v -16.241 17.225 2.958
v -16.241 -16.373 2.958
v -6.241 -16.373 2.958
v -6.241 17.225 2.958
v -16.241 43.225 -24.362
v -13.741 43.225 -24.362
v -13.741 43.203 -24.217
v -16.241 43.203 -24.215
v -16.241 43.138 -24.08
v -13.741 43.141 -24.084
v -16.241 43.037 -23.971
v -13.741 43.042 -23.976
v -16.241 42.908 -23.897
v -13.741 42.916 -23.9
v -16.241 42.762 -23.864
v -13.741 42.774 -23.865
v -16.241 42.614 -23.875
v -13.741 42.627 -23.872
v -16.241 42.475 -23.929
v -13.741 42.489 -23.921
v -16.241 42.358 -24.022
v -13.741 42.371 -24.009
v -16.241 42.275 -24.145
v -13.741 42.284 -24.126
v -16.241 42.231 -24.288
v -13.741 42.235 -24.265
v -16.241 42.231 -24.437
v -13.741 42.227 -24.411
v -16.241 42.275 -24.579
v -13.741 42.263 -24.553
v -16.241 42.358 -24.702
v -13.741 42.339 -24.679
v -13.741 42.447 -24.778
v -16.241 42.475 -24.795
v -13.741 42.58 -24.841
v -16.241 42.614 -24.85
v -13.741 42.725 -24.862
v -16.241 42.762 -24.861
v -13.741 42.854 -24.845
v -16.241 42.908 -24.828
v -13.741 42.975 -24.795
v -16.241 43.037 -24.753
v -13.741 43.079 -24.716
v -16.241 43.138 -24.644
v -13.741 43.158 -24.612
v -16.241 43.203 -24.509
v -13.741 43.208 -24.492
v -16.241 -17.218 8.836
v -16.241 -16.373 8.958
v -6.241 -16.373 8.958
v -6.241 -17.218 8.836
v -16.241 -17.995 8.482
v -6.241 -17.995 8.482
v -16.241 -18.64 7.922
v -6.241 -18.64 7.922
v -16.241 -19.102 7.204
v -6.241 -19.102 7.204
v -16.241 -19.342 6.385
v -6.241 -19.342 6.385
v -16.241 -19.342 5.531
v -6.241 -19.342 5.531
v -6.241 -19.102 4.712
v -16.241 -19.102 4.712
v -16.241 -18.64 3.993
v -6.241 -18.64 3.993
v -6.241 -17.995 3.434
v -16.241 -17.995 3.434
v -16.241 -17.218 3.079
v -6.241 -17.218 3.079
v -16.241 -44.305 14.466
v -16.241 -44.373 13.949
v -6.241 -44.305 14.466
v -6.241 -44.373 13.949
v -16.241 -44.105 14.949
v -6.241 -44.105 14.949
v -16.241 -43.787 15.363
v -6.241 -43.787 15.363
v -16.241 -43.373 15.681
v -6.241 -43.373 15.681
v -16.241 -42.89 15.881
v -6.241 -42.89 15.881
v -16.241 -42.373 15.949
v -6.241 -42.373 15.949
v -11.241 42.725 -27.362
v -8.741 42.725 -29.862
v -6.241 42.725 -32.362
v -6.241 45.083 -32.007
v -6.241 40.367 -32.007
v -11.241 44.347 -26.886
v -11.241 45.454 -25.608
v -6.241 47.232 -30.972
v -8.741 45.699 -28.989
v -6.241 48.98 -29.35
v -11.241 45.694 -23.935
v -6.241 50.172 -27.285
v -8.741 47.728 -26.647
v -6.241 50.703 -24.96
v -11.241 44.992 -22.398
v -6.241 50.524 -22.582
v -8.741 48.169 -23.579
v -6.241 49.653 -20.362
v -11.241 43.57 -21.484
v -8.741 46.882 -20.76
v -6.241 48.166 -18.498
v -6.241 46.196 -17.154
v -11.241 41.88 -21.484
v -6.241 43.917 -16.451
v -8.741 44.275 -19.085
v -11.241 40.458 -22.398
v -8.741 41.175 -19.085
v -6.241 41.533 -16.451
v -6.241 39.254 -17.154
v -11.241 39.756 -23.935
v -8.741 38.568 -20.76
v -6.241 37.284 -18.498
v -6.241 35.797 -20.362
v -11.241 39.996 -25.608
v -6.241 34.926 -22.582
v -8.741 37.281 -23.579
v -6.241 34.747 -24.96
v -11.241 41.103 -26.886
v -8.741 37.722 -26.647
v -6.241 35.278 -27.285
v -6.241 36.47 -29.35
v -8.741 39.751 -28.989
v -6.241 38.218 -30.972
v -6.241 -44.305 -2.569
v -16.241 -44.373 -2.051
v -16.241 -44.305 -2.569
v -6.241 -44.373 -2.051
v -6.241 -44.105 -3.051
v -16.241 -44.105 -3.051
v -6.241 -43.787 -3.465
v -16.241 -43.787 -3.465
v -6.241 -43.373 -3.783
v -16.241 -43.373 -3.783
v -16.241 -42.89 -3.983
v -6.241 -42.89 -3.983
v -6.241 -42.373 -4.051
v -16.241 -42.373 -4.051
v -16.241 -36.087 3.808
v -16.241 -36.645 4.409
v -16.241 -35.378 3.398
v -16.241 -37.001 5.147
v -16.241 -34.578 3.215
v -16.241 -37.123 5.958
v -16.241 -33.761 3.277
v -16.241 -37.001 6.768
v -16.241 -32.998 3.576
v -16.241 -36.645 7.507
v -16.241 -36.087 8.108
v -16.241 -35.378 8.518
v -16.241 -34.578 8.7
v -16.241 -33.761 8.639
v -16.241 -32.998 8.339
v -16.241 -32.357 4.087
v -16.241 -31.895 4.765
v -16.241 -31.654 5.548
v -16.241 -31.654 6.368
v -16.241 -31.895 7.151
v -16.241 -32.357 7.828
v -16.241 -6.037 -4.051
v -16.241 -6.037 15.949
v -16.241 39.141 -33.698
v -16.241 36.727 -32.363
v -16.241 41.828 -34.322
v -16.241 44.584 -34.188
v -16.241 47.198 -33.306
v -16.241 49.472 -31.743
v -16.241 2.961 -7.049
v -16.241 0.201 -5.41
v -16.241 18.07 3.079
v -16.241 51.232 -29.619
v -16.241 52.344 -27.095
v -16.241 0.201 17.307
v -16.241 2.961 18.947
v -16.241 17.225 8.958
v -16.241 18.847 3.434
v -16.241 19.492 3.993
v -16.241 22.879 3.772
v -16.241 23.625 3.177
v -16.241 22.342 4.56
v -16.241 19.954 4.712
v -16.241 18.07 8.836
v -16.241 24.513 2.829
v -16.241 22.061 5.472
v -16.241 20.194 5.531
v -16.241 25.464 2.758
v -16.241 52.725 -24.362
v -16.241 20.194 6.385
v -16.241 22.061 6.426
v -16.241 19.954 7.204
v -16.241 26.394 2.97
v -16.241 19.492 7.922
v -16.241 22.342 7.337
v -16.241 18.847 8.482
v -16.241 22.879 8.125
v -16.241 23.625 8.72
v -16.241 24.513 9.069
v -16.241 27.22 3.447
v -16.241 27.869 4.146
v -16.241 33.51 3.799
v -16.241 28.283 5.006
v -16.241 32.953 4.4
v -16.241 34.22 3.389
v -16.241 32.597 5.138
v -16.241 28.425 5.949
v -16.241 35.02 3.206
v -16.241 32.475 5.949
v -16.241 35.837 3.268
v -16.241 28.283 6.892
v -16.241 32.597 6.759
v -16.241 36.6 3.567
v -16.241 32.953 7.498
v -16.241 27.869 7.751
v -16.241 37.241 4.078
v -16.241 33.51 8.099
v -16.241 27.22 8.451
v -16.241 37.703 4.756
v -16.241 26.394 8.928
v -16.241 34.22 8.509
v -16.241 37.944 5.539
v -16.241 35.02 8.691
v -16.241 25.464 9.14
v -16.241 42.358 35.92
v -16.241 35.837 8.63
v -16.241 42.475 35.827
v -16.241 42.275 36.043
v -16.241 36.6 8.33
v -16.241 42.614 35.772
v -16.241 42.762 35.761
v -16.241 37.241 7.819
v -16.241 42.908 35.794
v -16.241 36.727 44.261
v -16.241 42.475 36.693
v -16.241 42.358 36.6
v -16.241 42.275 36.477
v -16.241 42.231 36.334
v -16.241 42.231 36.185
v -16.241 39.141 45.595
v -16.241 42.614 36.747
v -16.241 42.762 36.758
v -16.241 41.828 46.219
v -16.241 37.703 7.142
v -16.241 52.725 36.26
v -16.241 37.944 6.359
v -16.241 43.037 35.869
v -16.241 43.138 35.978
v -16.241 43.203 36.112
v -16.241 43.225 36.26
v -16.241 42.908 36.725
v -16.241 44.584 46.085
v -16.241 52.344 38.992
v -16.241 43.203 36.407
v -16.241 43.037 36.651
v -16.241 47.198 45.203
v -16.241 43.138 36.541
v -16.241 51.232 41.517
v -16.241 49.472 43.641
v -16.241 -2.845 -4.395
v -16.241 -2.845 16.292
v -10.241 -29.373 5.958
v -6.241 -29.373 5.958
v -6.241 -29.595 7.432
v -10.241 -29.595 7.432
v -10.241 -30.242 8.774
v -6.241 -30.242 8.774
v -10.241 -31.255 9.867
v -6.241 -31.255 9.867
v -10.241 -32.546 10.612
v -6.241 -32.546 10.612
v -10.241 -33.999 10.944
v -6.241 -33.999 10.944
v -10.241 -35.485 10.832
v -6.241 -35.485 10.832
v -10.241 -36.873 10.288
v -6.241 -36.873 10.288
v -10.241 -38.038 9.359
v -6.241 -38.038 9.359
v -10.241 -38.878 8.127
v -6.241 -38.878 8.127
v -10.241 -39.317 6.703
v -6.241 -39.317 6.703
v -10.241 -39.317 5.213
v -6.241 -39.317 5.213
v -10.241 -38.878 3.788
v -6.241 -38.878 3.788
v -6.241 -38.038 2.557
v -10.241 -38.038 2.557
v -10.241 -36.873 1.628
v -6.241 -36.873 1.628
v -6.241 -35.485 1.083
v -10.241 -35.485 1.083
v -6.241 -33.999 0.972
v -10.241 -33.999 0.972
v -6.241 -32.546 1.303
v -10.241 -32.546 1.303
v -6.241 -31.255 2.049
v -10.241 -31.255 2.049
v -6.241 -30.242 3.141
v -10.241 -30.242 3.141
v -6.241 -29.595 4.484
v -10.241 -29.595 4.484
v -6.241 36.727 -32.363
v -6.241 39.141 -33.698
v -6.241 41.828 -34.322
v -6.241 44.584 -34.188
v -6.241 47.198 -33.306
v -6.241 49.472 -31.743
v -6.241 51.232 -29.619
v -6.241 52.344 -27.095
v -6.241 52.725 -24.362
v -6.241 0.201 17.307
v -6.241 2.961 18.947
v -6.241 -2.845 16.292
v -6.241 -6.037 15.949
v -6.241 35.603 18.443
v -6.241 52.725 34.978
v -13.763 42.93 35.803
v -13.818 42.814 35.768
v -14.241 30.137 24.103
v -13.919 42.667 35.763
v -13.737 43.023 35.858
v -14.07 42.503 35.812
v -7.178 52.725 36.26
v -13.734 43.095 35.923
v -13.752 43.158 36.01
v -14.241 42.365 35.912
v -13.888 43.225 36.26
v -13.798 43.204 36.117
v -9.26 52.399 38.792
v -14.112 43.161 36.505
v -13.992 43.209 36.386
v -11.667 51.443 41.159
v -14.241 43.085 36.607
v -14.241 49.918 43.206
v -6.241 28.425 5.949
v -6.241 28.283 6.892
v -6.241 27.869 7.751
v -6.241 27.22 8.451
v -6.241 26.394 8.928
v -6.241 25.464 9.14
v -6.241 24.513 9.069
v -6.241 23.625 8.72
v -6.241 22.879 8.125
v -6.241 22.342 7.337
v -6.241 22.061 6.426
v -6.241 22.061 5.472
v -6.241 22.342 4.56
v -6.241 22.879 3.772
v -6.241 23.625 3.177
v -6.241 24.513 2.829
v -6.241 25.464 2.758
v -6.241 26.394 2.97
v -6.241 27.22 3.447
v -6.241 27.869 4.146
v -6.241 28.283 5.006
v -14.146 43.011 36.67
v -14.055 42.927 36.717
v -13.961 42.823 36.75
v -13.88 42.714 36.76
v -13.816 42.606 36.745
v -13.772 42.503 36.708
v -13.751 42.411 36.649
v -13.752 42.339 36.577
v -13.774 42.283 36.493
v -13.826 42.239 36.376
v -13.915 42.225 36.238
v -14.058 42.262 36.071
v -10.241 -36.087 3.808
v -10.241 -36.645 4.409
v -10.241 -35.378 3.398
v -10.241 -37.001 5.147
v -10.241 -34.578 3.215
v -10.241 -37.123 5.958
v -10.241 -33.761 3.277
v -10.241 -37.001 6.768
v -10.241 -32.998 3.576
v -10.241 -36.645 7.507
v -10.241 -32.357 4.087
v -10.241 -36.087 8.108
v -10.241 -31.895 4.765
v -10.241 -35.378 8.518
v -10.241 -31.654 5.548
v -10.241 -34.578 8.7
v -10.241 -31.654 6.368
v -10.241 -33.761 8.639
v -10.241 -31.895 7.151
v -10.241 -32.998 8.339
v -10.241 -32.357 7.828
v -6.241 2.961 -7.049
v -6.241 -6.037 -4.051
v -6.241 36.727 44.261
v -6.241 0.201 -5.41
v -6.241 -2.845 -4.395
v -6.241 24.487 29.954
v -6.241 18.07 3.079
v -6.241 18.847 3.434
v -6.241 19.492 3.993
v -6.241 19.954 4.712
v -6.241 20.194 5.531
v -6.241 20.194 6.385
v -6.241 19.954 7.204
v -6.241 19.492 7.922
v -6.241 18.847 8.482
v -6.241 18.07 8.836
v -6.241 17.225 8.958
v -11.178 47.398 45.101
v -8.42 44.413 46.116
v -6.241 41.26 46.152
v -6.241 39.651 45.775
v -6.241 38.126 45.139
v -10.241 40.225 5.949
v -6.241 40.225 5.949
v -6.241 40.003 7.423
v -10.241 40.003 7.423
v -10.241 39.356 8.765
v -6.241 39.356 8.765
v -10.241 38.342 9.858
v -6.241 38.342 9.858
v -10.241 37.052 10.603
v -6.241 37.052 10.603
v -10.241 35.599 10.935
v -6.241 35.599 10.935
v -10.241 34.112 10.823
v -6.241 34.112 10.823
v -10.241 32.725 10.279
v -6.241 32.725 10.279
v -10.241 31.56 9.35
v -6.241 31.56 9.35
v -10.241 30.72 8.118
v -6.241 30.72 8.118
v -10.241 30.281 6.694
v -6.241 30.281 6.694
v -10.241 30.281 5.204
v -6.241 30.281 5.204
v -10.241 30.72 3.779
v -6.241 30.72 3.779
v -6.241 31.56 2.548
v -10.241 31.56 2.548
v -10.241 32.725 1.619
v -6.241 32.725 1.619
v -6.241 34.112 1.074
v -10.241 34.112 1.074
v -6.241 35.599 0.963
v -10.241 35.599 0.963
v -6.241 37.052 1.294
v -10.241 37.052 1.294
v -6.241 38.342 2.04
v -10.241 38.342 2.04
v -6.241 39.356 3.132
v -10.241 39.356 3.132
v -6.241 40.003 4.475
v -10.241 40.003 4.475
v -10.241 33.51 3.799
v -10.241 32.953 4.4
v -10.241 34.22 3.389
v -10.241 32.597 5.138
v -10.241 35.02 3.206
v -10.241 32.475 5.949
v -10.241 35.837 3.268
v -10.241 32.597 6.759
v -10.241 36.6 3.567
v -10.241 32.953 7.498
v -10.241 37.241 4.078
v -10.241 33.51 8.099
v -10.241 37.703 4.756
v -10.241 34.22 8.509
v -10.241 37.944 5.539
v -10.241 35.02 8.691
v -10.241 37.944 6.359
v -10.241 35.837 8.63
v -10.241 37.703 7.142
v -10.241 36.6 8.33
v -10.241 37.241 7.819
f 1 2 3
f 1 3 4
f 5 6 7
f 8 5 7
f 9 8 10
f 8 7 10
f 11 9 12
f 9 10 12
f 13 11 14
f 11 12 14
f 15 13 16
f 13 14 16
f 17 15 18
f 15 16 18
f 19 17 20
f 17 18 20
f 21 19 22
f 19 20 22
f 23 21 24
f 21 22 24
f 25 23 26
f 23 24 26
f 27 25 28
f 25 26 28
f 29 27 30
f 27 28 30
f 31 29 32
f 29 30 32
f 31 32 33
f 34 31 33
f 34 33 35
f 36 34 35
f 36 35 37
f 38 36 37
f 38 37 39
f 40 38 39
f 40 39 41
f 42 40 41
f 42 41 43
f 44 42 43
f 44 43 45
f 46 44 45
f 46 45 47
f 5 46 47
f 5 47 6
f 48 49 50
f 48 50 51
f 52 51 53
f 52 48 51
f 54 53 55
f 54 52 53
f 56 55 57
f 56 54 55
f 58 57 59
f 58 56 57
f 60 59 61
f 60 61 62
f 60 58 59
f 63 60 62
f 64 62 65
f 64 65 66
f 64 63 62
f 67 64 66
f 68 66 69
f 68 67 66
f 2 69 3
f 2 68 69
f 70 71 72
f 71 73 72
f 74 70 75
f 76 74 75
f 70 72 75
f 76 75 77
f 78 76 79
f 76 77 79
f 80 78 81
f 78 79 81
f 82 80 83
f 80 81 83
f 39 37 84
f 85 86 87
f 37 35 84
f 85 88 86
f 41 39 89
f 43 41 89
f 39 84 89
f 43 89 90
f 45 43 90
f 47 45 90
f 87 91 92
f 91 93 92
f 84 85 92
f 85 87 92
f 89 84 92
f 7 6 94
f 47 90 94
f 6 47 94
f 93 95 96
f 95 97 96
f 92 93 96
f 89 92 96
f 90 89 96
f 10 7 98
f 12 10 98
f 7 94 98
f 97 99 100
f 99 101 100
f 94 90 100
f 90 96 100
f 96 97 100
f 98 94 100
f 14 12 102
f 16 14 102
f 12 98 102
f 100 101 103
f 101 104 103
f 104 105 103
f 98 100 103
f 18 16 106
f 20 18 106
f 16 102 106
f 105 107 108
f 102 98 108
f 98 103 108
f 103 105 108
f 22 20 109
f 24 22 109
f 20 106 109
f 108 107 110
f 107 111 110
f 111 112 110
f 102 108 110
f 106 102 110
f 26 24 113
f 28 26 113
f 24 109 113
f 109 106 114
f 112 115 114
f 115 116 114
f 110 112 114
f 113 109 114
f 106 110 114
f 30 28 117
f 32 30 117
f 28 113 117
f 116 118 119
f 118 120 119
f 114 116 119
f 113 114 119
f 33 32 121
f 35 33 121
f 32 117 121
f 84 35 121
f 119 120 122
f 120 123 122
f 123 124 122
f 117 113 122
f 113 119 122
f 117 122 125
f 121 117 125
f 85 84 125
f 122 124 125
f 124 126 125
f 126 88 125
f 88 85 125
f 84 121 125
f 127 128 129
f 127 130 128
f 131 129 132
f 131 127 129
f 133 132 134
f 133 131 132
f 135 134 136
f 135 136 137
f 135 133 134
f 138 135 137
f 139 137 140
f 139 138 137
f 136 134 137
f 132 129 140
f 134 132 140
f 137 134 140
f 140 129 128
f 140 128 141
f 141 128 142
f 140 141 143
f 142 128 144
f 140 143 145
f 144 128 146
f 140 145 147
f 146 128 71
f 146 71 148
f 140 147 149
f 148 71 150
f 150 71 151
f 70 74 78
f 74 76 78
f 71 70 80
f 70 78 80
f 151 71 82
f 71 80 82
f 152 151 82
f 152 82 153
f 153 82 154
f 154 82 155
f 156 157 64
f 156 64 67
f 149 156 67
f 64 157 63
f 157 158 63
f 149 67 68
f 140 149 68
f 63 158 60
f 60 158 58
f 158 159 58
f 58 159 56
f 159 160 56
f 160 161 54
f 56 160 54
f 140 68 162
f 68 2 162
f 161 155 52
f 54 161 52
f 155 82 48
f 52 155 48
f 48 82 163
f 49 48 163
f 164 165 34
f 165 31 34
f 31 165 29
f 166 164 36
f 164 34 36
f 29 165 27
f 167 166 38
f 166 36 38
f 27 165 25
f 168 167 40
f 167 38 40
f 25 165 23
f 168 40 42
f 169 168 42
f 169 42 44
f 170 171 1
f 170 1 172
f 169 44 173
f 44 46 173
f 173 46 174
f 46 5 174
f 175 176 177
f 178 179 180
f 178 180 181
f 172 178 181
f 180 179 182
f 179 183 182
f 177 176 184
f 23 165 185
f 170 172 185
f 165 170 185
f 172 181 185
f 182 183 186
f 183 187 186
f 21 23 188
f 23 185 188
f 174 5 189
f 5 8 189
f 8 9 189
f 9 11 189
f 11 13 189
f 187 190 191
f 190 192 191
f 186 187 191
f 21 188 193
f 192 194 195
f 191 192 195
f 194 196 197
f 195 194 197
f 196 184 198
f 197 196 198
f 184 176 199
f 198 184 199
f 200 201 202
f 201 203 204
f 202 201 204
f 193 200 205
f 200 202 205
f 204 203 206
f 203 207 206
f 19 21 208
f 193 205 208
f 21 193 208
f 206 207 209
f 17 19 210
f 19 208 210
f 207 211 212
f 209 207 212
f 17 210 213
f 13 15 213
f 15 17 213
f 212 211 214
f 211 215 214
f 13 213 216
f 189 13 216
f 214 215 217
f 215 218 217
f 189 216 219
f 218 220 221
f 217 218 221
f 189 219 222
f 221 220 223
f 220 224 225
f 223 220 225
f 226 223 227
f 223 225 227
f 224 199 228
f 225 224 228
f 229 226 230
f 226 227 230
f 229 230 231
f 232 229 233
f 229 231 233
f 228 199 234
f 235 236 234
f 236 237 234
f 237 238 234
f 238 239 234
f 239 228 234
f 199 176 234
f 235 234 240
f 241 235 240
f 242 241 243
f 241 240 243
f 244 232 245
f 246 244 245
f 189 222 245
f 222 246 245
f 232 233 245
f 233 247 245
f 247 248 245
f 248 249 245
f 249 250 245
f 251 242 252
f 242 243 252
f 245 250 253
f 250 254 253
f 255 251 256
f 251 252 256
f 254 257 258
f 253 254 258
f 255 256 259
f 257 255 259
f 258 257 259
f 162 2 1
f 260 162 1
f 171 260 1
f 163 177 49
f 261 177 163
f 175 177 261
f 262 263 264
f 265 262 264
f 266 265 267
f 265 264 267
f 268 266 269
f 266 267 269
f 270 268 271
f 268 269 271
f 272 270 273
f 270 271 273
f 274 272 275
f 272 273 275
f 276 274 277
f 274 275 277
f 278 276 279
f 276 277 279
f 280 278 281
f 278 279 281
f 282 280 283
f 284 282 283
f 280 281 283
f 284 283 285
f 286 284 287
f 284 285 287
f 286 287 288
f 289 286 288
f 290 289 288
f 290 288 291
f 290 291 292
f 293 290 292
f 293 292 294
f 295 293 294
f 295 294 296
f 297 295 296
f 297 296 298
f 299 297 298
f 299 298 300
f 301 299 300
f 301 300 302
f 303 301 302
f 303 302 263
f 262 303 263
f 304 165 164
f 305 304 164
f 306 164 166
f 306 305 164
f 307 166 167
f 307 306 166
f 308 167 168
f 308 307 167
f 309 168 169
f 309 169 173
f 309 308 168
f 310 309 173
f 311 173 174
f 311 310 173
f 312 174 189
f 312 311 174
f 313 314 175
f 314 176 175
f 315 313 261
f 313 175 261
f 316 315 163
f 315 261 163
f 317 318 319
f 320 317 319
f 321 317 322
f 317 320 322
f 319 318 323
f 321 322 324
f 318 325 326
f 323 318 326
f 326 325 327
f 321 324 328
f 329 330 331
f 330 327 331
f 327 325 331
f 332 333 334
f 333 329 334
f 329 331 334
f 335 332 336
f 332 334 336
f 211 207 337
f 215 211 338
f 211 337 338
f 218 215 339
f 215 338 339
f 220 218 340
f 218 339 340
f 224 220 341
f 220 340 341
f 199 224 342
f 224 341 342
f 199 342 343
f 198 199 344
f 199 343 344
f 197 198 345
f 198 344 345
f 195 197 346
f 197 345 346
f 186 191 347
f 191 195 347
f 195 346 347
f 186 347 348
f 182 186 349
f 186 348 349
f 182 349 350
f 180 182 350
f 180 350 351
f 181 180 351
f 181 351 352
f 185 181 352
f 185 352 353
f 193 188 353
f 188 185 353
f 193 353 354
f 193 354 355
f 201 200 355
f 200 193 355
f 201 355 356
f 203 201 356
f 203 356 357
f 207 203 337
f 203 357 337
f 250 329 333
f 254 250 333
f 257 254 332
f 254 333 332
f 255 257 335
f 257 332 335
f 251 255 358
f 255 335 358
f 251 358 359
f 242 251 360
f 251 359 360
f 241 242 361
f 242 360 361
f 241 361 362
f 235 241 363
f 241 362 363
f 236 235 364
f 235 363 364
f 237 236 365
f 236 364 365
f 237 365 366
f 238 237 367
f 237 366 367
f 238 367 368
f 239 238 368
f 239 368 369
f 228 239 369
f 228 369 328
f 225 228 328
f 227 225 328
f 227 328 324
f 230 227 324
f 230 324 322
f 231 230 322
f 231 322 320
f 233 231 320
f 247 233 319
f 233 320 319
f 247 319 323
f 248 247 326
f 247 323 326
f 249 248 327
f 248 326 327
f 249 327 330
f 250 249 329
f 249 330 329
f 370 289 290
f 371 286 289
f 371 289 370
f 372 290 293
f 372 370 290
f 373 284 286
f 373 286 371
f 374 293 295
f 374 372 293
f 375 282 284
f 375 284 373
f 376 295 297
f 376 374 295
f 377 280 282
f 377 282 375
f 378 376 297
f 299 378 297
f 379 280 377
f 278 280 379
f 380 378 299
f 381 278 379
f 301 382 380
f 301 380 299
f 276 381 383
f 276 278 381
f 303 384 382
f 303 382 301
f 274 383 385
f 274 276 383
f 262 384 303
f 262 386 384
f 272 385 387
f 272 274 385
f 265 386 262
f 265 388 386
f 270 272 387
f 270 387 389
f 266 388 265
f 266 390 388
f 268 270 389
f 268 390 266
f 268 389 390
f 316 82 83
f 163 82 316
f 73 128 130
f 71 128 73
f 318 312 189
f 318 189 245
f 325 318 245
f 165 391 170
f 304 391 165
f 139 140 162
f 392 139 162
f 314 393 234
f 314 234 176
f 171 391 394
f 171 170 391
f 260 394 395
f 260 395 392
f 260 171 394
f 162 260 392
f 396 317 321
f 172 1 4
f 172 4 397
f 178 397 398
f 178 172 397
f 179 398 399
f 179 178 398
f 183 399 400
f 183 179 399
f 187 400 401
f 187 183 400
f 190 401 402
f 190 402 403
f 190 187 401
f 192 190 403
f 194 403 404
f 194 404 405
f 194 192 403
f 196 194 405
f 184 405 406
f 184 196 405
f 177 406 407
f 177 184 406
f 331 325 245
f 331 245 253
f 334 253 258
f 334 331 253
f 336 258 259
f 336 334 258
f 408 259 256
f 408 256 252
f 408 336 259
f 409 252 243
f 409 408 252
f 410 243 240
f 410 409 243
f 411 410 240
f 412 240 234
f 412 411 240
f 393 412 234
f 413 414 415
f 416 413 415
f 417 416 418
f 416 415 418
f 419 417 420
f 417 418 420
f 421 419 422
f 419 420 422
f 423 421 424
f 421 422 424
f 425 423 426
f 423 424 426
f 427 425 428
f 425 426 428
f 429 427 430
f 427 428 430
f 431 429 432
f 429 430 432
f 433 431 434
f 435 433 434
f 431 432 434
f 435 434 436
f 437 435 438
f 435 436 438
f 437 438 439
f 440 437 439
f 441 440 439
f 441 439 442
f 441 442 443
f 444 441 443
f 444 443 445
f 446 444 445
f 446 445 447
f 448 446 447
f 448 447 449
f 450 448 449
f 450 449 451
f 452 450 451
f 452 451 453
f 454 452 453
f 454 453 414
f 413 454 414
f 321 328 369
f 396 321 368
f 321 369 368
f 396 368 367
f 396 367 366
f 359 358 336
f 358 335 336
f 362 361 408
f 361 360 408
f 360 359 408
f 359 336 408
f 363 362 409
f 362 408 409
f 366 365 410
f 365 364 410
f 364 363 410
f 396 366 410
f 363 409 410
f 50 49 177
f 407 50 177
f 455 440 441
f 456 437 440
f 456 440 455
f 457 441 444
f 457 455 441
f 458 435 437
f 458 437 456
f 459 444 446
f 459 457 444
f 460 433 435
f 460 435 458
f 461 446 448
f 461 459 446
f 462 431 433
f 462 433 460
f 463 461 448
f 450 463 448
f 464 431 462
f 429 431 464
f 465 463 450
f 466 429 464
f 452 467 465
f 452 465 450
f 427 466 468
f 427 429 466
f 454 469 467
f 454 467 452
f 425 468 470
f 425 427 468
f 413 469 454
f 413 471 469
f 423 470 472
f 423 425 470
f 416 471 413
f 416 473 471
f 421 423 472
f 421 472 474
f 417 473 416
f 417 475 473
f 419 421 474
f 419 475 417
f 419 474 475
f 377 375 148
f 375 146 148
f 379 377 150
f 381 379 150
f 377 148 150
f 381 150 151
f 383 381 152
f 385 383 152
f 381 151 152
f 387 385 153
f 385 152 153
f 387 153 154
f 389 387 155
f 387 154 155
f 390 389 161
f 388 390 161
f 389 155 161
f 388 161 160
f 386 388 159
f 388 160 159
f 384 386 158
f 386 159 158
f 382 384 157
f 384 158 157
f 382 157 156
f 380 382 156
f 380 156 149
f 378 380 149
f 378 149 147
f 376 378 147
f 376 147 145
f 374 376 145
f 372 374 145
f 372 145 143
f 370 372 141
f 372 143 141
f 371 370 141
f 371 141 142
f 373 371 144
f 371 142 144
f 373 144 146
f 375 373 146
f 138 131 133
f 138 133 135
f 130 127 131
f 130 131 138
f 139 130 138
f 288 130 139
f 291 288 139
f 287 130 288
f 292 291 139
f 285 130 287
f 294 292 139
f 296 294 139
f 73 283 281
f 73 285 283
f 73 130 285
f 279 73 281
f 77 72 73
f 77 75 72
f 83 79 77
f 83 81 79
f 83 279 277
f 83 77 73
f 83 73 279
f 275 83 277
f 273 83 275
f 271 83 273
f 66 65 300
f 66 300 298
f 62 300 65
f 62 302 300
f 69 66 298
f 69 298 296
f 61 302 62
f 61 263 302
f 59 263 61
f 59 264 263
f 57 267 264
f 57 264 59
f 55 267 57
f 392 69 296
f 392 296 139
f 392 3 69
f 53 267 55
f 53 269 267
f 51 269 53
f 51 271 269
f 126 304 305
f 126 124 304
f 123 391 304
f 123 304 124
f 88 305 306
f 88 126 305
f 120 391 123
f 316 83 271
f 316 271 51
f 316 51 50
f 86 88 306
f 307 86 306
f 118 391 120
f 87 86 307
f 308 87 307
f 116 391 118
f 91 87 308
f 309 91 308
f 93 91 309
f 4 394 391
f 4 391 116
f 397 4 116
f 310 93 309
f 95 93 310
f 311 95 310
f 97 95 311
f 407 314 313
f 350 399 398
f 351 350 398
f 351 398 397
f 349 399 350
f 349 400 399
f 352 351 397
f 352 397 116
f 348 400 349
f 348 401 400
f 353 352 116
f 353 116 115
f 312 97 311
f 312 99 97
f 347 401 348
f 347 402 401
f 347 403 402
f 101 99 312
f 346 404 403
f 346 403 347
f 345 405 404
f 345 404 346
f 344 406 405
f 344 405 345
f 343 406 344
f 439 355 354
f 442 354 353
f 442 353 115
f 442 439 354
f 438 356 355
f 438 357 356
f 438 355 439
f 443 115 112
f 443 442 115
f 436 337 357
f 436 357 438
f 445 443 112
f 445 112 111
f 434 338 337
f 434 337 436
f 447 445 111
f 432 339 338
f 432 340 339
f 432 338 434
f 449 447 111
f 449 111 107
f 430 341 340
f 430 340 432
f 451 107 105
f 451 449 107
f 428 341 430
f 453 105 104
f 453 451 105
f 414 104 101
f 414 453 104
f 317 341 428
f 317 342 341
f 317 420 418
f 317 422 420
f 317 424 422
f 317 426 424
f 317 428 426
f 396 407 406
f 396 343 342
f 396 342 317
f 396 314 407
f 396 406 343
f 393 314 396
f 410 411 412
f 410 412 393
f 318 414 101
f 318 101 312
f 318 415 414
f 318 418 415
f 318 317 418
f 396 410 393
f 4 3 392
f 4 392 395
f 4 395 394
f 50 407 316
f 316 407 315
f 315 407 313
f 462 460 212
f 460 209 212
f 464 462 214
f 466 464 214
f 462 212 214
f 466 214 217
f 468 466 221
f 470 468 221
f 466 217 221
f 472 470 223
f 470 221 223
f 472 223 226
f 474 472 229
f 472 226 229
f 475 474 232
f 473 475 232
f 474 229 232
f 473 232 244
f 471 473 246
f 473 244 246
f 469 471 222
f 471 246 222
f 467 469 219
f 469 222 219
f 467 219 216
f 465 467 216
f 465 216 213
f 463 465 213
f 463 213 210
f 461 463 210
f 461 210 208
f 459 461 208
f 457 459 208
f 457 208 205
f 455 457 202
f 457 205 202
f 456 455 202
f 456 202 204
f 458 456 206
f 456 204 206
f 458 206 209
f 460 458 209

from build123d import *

# Parameters (mm, degrees)
SKETCH_W           = 89.59788
SKETCH_H           = 20
PAD_DEPTH          = 10
SKETCH001_W        = 4
SKETCH001_H        = 19
PAD001_DEPTH       = 3
HOLE_D             = 5.5
HOLE_DEPTH         = 25
HOLE_CBORE_D       = 10
HOLE_CBORE_DEPTH   = 4
FILLET_R           = 2
SKETCH003_R        = 3.2
POCKET_DEPTH       = 13.001
SKETCH004_R        = 0.5
PAD002_DEPTH       = 10
POCKET001_DEPTH    = 17.5
FILLET001_R        = 15
POCKET002_DEPTH    = 3
POCKET002_FACE32_W = 4
POCKET002_FACE32_H = 19
POCKET003_DEPTH    = 3


with BuildPart() as part:
    # Sketch (on Face2 of Binder) → Pad (new body)
    with BuildSketch(Plane.YZ.offset(237.459106)):
        with Locations((0.426081, 189.84877)):
            Rectangle(SKETCH_W, SKETCH_H)
        with BuildLine():
            ThreePointArc((-16.372859, 192.857809), (-19.372859, 189.857809), (-16.372859, 186.857809))
            Line((-16.372859, 186.857809), (17.225021, 186.857809))
            ThreePointArc((17.225021, 186.857809), (20.225021, 189.857809), (17.225021, 192.857809))
            Line((-16.372859, 192.857809), (17.225021, 192.857809))
        make_face(mode=Mode.SUBTRACT)
    extrude(amount=PAD_DEPTH)

    # Sketch001 (on Face9 of Pad) → Pad001 (join)
    with BuildSketch(Plane(origin=(237.459106, 0, 0), x_dir=(0, -1, 0), z_dir=(-1, 0, 0))):
        with Locations((-23.225021, 189.84877)):
            Rectangle(SKETCH001_W, SKETCH001_H)
        with Locations((22.372859, 189.857809)):
            Rectangle(SKETCH001_W, SKETCH001_H)
    extrude(amount=PAD001_DEPTH)

    # Hole
    with Locations(Plane.YZ.offset(247.459106)):
        with Locations((-34.372859, 189.857809), (35.225021, 189.84877)):
            CounterBoreHole(HOLE_D / 2, HOLE_CBORE_D / 2, HOLE_CBORE_DEPTH, depth=HOLE_DEPTH)

    # Fillet
    fillet_edges = [part.edges().sort_by_distance(p)[0] for p in [
        (242.459106, 45.225021, 199.84877),
        (242.459106, 45.225021, 179.84877),
        (242.459106, -44.372859, 199.84877),
        (242.459106, -44.372859, 179.84877),
    ]]
    fillet(fillet_edges, radius=FILLET_R)

    # Sketch003 (on Face5 of Fillet) → Pocket (cut, through all)
    with BuildSketch(Plane.YZ.offset(247.459106)):
        with Locations((25.225021, 189.84877)):
            Circle(SKETCH003_R)
    extrude(amount=-POCKET_DEPTH, mode=Mode.SUBTRACT)

    # Sketch004 (on Face5 of Pocket) → Pad002 (join)
    with BuildSketch(Plane.YZ.offset(247.459106)):
        with BuildLine():
            ThreePointArc((52.725021, 220.159659), (47.198029, 229.103495), (36.726581, 228.160829))
            Line((36.726581, 228.160829), (-1.038162, 199.84877))
            Line((43.225021, 199.84877), (-1.038162, 199.84877))
            Line((43.225021, 179.84877), (43.225021, 199.84877))
            Line((-1.038162, 179.84877), (43.225021, 179.84877))
            Line((-1.038162, 179.84877), (36.726581, 151.536712))
            ThreePointArc((36.726581, 151.536712), (47.198029, 150.594045), (52.725021, 159.537881))
            Line((52.725021, 159.537881), (52.725021, 220.159659))
        make_face()
        with Locations((42.725021, 220.159659)):
            Circle(SKETCH004_R, mode=Mode.SUBTRACT)
        with Locations((42.725021, 159.537881)):
            Circle(SKETCH004_R, mode=Mode.SUBTRACT)
    extrude(amount=-PAD002_DEPTH)

    # Sketch005 (on DatumPlane) → Groove (revolve, cut)
    with BuildSketch(Plane(origin=(247.459106, 42.725021, 159.537881), x_dir=(0, 0, 1), z_dir=(0, 1, 0))):
        Polygon((0, 21.851335), (0, -8), (-29.851335, 21.851335), align=None)
    revolve(axis=Axis((247.459106, 42.725021, 159.537881), (1, 0, 0)), mode=Mode.SUBTRACT)

    # Sketch006 (on DatumPlane) → Pocket001 (cut, symmetric)
    with BuildSketch(Plane(origin=(247.459106, 42.725021, 220.159659), x_dir=(0, -0.694658, 0.71934), z_dir=(0, 0.71934, 0.694658))):
        Polygon((0, -8), (12.395839, 4.192451), (-11.9924, 4.192451), align=None)
    extrude(amount=POCKET001_DEPTH, both=True, mode=Mode.SUBTRACT)

    # Fillet001
    fillet001_edges = [part.edges().sort_by_distance(p)[0] for p in [
        (242.459106, -1.038162, 179.84877),
        (242.459106, -1.038162, 199.84877),
    ]]
    fillet(fillet001_edges, radius=FILLET001_R)

    # Fillet001 Face36 → Pocket002 (cut)
    with BuildSketch(Plane(origin=(234.459106, 23.052701, 189.84877), x_dir=(0, 1, 0), z_dir=(-1, 0, 0))):
        with BuildLine():
            Line((2.17232, -9.5), (2.17232, -3.2))
            ThreePointArc((2.17232, -3.2), (-1.02768, 0), (2.17232, 3.2))
            Line((2.17232, 3.2), (2.17232, 9.5))
            Line((2.17232, 9.5), (-1.82768, 9.5))
            Line((-1.82768, 9.5), (-1.82768, -9.5))
            Line((-1.82768, -9.5), (2.17232, -9.5))
        make_face()
    extrude(amount=-POCKET002_DEPTH, mode=Mode.SUBTRACT)

    # Pocket002 Face32 → Pocket003 (cut)
    with BuildSketch(Plane(origin=(234.459106, -22.372859, 189.857809), x_dir=(0, 1, 0), z_dir=(-1, 0, 0))):
        Rectangle(POCKET002_FACE32_W, POCKET002_FACE32_H)
    extrude(amount=-POCKET003_DEPTH, mode=Mode.SUBTRACT)


with BuildPart() as part_1:
    # Body placement: moved
    add(part.part.moved(Location((-253.7, 0, -183.9))))


solid = part_1.part
